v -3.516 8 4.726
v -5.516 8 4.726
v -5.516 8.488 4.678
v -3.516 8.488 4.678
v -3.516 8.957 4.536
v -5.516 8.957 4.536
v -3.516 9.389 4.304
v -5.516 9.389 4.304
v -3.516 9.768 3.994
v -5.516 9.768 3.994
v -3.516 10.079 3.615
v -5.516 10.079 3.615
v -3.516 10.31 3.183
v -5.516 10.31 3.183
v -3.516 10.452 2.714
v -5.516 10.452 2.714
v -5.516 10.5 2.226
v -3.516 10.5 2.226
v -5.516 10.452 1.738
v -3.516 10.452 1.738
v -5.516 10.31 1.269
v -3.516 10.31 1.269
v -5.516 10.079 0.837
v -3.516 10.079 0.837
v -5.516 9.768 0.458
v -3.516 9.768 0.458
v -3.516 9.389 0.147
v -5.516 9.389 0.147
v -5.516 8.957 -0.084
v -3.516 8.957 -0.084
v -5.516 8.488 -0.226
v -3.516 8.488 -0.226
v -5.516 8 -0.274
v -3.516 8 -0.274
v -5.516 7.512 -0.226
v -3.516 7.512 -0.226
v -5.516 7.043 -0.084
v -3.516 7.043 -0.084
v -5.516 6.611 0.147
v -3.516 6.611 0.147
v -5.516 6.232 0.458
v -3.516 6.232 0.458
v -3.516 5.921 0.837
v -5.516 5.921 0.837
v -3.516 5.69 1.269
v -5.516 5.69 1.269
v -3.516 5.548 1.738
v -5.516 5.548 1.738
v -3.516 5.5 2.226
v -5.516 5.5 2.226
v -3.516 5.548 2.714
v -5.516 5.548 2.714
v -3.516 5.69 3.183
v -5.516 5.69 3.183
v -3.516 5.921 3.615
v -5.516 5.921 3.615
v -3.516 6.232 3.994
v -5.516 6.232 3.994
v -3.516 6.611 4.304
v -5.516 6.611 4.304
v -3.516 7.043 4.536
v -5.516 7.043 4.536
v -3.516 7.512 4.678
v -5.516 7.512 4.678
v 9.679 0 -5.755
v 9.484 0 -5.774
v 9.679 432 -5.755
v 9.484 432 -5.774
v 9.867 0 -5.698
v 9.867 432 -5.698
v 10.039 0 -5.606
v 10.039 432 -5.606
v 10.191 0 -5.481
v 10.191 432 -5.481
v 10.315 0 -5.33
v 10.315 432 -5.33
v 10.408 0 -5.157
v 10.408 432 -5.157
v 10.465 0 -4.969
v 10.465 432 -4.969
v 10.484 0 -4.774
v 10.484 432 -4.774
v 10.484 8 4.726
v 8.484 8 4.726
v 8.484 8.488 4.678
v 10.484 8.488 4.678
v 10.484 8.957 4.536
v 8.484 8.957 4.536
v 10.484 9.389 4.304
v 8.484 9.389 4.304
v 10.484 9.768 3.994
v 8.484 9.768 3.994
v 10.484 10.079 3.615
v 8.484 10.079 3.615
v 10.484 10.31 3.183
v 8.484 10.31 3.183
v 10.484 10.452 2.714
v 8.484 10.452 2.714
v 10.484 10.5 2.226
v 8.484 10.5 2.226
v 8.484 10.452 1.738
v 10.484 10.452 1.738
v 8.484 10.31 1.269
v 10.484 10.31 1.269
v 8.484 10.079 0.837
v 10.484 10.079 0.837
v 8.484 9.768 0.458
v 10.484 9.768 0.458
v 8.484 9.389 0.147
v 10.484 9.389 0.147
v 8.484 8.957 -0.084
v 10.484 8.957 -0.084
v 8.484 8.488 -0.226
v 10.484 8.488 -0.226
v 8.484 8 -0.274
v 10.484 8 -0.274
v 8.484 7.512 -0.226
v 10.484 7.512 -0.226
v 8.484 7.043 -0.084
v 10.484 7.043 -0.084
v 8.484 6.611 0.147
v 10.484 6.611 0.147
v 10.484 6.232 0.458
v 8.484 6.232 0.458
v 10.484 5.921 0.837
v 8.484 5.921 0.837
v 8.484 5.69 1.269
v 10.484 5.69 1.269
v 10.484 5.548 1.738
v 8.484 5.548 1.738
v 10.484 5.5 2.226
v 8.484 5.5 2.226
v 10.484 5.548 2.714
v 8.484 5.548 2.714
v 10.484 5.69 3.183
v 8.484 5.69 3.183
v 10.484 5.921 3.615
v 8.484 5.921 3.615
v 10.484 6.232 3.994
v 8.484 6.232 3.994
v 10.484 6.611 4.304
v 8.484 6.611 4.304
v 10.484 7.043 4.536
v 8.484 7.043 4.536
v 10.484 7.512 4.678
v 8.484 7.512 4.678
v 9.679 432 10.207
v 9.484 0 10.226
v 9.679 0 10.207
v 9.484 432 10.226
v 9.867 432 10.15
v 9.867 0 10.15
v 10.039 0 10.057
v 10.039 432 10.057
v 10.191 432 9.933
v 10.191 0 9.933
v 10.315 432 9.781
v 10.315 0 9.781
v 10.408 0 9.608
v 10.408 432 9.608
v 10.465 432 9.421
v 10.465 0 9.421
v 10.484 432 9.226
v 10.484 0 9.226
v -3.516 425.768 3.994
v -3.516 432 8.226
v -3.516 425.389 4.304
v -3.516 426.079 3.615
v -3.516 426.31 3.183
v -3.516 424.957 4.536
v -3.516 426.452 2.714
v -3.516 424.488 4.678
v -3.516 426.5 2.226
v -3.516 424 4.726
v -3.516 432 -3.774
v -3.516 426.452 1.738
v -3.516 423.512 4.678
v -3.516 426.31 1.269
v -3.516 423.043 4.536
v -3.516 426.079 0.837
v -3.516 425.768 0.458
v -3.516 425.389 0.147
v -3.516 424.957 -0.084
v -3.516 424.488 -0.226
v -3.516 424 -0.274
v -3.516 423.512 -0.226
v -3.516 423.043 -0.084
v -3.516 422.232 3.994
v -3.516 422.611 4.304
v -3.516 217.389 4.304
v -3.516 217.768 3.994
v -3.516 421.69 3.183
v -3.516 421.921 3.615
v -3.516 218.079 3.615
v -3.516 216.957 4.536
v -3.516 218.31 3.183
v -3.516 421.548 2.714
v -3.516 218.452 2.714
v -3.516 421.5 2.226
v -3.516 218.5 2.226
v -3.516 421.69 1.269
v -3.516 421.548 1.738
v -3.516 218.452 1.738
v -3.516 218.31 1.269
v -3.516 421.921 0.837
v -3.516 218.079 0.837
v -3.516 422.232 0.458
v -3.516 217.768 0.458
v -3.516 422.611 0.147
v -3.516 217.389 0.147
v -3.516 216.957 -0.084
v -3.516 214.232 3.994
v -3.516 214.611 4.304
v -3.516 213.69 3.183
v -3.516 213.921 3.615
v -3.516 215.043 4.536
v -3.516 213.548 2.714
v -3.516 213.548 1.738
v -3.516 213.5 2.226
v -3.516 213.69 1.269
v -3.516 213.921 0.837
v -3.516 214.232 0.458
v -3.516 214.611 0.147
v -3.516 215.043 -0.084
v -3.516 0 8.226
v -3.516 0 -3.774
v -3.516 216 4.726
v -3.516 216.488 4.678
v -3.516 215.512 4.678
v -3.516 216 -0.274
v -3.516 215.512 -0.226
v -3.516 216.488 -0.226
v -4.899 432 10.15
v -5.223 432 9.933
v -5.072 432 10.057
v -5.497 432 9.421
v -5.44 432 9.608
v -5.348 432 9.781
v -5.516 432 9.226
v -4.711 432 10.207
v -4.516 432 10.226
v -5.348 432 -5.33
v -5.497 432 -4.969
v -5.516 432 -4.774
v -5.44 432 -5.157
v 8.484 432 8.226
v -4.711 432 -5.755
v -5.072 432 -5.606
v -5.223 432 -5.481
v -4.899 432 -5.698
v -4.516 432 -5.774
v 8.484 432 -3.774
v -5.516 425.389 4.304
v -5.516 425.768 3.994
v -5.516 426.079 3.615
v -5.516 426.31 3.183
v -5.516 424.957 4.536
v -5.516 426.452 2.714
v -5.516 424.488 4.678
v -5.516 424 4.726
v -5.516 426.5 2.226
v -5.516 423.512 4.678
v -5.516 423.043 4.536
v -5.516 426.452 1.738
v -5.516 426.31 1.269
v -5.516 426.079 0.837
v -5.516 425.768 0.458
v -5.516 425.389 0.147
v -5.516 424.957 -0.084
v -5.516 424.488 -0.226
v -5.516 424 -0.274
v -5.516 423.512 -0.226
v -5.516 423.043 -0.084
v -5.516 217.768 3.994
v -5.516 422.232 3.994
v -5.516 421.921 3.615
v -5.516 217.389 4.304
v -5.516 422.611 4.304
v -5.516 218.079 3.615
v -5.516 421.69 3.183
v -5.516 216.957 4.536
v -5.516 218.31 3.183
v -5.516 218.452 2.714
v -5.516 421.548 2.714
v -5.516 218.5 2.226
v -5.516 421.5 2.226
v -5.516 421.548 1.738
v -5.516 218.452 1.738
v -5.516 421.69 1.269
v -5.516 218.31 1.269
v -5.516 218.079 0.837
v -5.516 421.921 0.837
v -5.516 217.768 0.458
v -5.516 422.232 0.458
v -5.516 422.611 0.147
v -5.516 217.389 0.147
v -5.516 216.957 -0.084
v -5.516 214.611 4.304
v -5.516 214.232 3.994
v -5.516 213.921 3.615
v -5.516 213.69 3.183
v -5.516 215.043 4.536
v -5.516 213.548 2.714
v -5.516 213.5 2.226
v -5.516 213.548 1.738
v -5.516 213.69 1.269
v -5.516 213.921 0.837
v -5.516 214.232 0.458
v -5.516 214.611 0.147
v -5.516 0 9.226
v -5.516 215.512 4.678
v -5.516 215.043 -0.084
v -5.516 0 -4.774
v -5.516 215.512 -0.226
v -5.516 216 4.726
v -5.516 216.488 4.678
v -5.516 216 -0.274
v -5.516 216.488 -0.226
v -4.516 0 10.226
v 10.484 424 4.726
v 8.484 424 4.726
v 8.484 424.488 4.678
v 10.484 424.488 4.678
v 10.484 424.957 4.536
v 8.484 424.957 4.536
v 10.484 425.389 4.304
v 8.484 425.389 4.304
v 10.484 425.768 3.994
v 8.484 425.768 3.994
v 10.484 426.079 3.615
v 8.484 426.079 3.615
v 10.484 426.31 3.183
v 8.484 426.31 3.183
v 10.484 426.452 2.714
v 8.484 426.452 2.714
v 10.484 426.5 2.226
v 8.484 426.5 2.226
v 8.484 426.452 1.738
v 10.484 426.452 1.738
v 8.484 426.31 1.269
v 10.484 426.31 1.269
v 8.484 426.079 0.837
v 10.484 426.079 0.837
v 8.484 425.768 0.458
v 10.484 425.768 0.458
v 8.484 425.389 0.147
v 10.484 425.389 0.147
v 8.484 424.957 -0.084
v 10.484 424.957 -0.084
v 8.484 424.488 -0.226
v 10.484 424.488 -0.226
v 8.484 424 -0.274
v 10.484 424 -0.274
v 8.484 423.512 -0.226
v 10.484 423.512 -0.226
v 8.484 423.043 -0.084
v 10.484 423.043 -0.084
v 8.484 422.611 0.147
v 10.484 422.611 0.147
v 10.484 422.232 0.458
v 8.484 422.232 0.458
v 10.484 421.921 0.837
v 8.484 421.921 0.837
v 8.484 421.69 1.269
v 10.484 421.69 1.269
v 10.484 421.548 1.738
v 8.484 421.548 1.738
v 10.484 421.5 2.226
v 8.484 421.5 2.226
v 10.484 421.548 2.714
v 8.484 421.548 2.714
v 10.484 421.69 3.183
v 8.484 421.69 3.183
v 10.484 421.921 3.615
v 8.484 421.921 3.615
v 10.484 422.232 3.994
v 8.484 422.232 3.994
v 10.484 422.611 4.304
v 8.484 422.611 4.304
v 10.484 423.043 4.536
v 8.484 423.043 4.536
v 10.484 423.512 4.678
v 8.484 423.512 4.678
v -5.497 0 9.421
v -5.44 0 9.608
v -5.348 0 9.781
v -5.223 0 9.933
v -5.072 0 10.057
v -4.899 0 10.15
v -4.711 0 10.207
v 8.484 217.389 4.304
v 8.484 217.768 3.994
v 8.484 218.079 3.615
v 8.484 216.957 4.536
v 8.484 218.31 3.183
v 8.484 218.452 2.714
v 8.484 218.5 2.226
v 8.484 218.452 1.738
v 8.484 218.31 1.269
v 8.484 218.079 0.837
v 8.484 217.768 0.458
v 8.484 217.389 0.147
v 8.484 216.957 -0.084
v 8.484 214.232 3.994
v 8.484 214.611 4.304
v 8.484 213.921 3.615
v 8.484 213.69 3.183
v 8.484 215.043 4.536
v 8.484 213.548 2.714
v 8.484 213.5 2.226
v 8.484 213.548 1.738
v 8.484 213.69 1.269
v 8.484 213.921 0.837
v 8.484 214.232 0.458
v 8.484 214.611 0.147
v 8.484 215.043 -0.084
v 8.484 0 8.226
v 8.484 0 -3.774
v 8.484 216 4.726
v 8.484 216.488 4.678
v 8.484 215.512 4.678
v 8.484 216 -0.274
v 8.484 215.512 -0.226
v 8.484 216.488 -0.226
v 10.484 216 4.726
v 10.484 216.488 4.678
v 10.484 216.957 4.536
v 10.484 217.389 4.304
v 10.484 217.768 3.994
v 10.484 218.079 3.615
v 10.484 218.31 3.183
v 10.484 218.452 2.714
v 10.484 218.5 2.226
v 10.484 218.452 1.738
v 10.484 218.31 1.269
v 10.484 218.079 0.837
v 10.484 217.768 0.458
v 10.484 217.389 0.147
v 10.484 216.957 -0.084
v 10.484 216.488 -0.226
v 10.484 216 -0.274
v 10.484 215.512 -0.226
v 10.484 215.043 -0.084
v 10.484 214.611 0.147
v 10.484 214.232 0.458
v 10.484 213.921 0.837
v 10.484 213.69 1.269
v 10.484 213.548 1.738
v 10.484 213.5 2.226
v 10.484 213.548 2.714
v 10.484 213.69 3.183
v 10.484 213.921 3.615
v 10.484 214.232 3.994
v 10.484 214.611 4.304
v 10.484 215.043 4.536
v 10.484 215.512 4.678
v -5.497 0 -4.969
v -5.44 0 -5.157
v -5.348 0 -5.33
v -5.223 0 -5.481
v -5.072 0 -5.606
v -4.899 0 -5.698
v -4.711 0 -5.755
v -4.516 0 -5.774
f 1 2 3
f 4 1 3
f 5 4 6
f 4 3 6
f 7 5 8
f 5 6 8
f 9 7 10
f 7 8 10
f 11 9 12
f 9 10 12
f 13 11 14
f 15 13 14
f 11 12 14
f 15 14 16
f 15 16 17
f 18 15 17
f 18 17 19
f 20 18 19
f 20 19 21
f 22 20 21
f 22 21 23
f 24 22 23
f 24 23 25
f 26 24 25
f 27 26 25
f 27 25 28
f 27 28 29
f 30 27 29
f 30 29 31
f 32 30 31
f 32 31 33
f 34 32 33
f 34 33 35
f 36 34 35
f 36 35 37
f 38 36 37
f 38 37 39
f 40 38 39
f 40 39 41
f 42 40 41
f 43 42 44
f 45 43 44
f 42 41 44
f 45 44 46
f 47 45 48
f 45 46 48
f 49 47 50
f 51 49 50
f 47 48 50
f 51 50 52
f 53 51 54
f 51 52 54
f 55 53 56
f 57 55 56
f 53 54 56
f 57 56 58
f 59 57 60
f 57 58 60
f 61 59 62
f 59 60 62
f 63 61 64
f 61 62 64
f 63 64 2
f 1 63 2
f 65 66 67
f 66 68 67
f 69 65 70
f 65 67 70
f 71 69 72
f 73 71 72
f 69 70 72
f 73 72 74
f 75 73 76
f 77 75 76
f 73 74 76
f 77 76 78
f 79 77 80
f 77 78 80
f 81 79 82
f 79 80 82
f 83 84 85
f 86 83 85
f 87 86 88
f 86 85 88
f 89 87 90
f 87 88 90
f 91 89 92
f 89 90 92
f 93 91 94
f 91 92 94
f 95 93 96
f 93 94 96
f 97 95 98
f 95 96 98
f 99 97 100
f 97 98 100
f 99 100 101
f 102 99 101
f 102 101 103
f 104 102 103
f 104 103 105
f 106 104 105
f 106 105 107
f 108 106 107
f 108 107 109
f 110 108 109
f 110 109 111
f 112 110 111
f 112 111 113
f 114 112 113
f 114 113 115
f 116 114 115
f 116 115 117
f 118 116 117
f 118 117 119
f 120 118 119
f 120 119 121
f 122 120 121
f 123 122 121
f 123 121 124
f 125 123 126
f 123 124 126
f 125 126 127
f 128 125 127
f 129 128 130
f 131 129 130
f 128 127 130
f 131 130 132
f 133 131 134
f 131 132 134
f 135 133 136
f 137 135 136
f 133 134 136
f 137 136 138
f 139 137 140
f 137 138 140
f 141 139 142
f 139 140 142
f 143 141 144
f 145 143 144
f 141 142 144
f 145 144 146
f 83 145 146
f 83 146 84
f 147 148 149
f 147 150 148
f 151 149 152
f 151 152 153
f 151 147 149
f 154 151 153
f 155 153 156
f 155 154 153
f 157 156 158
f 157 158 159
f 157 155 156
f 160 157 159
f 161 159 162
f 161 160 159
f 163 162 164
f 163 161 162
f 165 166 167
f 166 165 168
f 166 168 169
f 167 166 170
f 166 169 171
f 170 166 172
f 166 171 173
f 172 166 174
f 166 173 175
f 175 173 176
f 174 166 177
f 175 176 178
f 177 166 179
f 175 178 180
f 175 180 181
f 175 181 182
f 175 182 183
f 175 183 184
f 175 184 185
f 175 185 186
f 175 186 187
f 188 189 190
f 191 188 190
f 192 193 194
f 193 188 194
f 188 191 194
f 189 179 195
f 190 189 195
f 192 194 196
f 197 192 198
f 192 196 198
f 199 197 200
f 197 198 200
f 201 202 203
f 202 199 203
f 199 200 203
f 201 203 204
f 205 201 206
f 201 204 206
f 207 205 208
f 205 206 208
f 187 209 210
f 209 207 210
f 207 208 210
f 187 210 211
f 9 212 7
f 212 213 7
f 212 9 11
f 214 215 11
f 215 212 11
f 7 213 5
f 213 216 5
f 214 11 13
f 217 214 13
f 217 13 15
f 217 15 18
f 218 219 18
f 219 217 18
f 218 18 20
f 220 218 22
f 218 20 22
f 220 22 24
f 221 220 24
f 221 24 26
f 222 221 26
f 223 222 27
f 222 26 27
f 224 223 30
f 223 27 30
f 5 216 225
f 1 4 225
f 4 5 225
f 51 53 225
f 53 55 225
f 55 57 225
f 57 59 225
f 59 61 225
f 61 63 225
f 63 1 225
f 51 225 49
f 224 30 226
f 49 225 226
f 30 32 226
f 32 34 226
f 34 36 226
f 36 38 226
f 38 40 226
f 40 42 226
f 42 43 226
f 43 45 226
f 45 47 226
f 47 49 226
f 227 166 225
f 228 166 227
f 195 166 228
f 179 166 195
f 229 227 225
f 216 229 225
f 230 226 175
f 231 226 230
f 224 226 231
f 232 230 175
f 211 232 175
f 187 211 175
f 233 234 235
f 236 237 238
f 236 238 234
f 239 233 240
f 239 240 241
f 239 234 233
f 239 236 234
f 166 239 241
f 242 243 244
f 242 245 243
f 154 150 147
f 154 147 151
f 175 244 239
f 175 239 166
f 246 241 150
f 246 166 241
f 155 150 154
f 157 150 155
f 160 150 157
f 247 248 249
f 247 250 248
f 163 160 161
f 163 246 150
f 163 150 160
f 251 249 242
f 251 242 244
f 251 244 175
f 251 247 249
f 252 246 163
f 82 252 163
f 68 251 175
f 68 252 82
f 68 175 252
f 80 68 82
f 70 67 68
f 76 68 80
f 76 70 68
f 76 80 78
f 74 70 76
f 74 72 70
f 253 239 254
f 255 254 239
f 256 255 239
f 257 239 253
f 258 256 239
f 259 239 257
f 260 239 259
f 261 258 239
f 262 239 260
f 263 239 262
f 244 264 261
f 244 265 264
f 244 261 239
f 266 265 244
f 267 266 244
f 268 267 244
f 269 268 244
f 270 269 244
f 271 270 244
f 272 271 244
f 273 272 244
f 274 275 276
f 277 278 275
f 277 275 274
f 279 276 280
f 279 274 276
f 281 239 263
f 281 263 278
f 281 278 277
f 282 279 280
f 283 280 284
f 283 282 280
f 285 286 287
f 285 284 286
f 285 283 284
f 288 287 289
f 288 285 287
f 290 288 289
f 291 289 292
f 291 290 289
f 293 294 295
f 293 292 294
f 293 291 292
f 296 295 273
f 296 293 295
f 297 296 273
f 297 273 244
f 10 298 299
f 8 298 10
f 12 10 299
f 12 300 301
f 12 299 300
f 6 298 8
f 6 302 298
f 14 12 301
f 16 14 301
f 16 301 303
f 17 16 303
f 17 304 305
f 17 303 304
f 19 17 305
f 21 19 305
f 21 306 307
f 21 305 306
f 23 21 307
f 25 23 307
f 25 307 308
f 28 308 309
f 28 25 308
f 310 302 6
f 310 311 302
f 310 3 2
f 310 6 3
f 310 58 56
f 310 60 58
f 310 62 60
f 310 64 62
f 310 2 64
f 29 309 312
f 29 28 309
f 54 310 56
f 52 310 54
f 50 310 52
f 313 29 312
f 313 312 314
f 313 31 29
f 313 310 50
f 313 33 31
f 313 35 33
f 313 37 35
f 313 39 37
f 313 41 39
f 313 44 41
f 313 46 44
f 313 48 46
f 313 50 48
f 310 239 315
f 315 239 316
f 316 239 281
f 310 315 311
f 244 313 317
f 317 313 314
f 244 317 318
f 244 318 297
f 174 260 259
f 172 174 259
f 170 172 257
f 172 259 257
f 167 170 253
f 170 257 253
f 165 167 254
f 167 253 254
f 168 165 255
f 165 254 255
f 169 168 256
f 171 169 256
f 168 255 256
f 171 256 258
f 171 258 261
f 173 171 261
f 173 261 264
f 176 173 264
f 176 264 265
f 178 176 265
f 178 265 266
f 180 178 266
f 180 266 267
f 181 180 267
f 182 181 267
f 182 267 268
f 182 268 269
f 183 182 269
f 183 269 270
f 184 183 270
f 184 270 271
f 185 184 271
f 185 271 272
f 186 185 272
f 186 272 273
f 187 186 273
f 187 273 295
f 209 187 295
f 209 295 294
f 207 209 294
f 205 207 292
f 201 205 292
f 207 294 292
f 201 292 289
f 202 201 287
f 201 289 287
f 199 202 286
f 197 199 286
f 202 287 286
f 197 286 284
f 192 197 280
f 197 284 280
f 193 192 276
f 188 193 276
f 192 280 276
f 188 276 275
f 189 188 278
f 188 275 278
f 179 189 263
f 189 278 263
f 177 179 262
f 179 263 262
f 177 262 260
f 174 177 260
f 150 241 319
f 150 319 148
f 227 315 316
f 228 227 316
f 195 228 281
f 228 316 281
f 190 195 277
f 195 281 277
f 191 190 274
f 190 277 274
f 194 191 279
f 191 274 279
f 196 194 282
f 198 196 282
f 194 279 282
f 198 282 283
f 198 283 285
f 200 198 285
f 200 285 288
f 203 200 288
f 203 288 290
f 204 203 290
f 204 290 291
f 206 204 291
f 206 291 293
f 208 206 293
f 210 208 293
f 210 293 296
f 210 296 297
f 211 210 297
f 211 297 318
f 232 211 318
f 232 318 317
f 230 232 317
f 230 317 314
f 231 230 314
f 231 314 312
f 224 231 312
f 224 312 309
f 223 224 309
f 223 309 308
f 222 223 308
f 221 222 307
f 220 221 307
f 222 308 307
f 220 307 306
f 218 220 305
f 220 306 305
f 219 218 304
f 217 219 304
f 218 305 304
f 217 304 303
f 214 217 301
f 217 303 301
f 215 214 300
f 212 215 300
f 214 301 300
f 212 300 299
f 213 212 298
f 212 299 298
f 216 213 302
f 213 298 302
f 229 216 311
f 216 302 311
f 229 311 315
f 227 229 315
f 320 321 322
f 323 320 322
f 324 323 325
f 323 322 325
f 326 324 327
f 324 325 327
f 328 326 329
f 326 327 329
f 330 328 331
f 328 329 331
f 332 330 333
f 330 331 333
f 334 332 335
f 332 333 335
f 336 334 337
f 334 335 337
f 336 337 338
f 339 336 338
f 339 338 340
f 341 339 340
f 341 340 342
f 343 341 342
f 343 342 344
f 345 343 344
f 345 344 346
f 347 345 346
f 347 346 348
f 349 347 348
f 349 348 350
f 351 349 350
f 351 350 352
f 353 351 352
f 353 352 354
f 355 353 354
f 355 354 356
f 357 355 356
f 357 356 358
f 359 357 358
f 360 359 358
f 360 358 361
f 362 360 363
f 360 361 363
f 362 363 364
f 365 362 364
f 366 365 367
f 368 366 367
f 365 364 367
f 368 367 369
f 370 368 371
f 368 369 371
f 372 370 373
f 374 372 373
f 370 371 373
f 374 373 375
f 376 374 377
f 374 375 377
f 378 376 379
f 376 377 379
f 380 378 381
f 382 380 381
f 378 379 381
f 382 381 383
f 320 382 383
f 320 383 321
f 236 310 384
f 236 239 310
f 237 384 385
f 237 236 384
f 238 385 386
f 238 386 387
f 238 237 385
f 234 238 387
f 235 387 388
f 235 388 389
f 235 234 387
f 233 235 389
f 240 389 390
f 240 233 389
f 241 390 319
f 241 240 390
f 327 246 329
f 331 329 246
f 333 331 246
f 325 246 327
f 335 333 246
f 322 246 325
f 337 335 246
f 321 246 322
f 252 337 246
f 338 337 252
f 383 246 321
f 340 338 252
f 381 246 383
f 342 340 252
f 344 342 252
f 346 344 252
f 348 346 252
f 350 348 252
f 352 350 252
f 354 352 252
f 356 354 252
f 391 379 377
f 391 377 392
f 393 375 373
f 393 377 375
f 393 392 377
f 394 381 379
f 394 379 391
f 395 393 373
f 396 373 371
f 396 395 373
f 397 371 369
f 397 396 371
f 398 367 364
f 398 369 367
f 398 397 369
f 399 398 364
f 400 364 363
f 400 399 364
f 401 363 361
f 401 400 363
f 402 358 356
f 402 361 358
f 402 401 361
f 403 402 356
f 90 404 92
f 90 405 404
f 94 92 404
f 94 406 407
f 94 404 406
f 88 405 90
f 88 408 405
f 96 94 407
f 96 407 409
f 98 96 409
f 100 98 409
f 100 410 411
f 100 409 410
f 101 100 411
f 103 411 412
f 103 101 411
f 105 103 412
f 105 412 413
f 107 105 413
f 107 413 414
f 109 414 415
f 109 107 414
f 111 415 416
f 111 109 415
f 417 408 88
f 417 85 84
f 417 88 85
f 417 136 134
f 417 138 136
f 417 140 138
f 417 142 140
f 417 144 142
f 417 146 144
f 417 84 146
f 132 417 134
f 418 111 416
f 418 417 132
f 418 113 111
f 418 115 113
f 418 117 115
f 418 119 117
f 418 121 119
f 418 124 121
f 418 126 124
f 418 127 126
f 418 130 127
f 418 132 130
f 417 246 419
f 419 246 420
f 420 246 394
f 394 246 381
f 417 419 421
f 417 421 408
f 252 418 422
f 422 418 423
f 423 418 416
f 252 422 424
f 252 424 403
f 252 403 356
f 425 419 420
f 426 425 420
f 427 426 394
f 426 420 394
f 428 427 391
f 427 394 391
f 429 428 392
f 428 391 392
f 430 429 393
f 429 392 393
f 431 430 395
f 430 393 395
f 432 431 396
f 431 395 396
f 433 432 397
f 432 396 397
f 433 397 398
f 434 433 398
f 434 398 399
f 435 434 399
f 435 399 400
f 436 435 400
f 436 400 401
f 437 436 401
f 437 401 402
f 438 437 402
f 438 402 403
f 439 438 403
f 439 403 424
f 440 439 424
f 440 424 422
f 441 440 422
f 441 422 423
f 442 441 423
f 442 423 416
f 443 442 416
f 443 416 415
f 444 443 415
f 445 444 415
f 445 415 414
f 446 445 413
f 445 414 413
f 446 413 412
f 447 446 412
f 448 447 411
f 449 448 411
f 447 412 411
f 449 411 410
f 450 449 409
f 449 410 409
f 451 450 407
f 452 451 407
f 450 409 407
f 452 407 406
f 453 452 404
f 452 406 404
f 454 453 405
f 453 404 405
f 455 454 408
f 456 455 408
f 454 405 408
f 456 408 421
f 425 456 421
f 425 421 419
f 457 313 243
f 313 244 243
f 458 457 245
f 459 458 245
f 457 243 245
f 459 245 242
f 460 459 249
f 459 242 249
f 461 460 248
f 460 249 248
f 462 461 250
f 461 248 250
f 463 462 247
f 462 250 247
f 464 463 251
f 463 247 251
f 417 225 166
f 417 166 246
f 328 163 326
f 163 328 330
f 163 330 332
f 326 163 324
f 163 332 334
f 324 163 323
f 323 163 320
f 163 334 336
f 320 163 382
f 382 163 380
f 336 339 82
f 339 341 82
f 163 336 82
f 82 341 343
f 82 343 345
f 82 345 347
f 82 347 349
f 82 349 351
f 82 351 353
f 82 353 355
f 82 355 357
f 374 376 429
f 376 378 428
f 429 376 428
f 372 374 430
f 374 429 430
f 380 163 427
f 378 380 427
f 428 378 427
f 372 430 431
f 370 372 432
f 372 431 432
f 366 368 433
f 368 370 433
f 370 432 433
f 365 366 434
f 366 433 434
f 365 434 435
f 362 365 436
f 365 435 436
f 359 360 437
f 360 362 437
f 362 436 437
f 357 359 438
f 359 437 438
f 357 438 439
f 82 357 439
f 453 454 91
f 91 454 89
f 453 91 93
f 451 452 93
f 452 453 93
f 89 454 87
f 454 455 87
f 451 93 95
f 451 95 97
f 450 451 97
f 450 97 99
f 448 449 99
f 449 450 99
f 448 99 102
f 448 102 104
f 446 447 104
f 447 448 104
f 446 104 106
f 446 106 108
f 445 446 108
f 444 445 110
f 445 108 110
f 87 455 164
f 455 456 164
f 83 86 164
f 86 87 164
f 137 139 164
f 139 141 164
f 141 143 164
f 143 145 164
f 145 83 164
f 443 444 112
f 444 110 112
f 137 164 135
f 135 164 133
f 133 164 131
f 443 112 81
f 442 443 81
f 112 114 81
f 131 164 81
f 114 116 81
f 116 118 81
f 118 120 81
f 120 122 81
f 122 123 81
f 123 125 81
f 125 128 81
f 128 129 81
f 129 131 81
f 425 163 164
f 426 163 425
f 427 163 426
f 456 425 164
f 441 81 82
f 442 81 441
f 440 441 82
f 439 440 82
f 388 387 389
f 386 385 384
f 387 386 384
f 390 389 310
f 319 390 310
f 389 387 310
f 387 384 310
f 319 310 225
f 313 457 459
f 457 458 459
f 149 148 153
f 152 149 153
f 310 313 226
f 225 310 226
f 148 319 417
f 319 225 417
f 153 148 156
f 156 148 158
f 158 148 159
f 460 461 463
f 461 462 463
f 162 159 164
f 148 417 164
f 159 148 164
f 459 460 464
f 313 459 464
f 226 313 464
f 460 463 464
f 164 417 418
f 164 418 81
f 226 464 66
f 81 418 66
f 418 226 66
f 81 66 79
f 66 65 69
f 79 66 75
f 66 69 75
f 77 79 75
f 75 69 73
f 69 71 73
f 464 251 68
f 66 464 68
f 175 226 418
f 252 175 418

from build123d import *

# Parameters (mm, degrees)
SKETCH1_W           = 16
SKETCH1_H           = 16
SKETCH1_W_2         = 12
SKETCH1_H_2         = 12
BOSS_EXTRUDE1_DEPTH = 432
FILLET1_R           = 1
SKETCH2_R           = 2.5
CUT_EXTRUDE1_DEPTH  = 16
SKETCH3_R           = 2.5
CUT_EXTRUDE2_DEPTH  = 16


with BuildPart() as part:
    # Sketch1 → Boss-Extrude1 (new body)
    with BuildSketch(Plane(origin=(0, 0, 0), x_dir=(1, 0, 0), z_dir=(0, 1, 0))):
        with Locations((2.483870968, -2.225806452)):
            Rectangle(SKETCH1_W, SKETCH1_H)
        with Locations((2.483870968, -2.225806452)):
            Rectangle(SKETCH1_W_2, SKETCH1_H_2, mode=Mode.SUBTRACT)
    extrude(amount=BOSS_EXTRUDE1_DEPTH)

    # Fillet1
    fillet1_edges = [part.edges().sort_by_distance(p)[0] for p in [
        (-5.516129032, 216, -5.774193548),
        (10.483870968, 216, -5.774193548),
        (10.483870968, 216, 10.225806452),
        (-5.516129032, 216, 10.225806452),
    ]]
    fillet(fillet1_edges, radius=FILLET1_R)

    # Sketch2 → Cut-Extrude1 (cut)
    with BuildSketch(Plane.ZY.offset(5.516129032)):
        with Locations((2.225806452, 424)):
            Circle(SKETCH2_R)
        with Locations((2.225806452, 8)):
            Circle(SKETCH2_R)
    extrude(amount=-CUT_EXTRUDE1_DEPTH, mode=Mode.SUBTRACT)

    # Sketch3 → Cut-Extrude2 (cut)
    with BuildSketch(Plane.ZY.offset(5.516129032)):
        with Locations((2.225806452, 216)):
            Circle(SKETCH3_R)
    extrude(amount=-CUT_EXTRUDE2_DEPTH, mode=Mode.SUBTRACT)


solid = part.part
